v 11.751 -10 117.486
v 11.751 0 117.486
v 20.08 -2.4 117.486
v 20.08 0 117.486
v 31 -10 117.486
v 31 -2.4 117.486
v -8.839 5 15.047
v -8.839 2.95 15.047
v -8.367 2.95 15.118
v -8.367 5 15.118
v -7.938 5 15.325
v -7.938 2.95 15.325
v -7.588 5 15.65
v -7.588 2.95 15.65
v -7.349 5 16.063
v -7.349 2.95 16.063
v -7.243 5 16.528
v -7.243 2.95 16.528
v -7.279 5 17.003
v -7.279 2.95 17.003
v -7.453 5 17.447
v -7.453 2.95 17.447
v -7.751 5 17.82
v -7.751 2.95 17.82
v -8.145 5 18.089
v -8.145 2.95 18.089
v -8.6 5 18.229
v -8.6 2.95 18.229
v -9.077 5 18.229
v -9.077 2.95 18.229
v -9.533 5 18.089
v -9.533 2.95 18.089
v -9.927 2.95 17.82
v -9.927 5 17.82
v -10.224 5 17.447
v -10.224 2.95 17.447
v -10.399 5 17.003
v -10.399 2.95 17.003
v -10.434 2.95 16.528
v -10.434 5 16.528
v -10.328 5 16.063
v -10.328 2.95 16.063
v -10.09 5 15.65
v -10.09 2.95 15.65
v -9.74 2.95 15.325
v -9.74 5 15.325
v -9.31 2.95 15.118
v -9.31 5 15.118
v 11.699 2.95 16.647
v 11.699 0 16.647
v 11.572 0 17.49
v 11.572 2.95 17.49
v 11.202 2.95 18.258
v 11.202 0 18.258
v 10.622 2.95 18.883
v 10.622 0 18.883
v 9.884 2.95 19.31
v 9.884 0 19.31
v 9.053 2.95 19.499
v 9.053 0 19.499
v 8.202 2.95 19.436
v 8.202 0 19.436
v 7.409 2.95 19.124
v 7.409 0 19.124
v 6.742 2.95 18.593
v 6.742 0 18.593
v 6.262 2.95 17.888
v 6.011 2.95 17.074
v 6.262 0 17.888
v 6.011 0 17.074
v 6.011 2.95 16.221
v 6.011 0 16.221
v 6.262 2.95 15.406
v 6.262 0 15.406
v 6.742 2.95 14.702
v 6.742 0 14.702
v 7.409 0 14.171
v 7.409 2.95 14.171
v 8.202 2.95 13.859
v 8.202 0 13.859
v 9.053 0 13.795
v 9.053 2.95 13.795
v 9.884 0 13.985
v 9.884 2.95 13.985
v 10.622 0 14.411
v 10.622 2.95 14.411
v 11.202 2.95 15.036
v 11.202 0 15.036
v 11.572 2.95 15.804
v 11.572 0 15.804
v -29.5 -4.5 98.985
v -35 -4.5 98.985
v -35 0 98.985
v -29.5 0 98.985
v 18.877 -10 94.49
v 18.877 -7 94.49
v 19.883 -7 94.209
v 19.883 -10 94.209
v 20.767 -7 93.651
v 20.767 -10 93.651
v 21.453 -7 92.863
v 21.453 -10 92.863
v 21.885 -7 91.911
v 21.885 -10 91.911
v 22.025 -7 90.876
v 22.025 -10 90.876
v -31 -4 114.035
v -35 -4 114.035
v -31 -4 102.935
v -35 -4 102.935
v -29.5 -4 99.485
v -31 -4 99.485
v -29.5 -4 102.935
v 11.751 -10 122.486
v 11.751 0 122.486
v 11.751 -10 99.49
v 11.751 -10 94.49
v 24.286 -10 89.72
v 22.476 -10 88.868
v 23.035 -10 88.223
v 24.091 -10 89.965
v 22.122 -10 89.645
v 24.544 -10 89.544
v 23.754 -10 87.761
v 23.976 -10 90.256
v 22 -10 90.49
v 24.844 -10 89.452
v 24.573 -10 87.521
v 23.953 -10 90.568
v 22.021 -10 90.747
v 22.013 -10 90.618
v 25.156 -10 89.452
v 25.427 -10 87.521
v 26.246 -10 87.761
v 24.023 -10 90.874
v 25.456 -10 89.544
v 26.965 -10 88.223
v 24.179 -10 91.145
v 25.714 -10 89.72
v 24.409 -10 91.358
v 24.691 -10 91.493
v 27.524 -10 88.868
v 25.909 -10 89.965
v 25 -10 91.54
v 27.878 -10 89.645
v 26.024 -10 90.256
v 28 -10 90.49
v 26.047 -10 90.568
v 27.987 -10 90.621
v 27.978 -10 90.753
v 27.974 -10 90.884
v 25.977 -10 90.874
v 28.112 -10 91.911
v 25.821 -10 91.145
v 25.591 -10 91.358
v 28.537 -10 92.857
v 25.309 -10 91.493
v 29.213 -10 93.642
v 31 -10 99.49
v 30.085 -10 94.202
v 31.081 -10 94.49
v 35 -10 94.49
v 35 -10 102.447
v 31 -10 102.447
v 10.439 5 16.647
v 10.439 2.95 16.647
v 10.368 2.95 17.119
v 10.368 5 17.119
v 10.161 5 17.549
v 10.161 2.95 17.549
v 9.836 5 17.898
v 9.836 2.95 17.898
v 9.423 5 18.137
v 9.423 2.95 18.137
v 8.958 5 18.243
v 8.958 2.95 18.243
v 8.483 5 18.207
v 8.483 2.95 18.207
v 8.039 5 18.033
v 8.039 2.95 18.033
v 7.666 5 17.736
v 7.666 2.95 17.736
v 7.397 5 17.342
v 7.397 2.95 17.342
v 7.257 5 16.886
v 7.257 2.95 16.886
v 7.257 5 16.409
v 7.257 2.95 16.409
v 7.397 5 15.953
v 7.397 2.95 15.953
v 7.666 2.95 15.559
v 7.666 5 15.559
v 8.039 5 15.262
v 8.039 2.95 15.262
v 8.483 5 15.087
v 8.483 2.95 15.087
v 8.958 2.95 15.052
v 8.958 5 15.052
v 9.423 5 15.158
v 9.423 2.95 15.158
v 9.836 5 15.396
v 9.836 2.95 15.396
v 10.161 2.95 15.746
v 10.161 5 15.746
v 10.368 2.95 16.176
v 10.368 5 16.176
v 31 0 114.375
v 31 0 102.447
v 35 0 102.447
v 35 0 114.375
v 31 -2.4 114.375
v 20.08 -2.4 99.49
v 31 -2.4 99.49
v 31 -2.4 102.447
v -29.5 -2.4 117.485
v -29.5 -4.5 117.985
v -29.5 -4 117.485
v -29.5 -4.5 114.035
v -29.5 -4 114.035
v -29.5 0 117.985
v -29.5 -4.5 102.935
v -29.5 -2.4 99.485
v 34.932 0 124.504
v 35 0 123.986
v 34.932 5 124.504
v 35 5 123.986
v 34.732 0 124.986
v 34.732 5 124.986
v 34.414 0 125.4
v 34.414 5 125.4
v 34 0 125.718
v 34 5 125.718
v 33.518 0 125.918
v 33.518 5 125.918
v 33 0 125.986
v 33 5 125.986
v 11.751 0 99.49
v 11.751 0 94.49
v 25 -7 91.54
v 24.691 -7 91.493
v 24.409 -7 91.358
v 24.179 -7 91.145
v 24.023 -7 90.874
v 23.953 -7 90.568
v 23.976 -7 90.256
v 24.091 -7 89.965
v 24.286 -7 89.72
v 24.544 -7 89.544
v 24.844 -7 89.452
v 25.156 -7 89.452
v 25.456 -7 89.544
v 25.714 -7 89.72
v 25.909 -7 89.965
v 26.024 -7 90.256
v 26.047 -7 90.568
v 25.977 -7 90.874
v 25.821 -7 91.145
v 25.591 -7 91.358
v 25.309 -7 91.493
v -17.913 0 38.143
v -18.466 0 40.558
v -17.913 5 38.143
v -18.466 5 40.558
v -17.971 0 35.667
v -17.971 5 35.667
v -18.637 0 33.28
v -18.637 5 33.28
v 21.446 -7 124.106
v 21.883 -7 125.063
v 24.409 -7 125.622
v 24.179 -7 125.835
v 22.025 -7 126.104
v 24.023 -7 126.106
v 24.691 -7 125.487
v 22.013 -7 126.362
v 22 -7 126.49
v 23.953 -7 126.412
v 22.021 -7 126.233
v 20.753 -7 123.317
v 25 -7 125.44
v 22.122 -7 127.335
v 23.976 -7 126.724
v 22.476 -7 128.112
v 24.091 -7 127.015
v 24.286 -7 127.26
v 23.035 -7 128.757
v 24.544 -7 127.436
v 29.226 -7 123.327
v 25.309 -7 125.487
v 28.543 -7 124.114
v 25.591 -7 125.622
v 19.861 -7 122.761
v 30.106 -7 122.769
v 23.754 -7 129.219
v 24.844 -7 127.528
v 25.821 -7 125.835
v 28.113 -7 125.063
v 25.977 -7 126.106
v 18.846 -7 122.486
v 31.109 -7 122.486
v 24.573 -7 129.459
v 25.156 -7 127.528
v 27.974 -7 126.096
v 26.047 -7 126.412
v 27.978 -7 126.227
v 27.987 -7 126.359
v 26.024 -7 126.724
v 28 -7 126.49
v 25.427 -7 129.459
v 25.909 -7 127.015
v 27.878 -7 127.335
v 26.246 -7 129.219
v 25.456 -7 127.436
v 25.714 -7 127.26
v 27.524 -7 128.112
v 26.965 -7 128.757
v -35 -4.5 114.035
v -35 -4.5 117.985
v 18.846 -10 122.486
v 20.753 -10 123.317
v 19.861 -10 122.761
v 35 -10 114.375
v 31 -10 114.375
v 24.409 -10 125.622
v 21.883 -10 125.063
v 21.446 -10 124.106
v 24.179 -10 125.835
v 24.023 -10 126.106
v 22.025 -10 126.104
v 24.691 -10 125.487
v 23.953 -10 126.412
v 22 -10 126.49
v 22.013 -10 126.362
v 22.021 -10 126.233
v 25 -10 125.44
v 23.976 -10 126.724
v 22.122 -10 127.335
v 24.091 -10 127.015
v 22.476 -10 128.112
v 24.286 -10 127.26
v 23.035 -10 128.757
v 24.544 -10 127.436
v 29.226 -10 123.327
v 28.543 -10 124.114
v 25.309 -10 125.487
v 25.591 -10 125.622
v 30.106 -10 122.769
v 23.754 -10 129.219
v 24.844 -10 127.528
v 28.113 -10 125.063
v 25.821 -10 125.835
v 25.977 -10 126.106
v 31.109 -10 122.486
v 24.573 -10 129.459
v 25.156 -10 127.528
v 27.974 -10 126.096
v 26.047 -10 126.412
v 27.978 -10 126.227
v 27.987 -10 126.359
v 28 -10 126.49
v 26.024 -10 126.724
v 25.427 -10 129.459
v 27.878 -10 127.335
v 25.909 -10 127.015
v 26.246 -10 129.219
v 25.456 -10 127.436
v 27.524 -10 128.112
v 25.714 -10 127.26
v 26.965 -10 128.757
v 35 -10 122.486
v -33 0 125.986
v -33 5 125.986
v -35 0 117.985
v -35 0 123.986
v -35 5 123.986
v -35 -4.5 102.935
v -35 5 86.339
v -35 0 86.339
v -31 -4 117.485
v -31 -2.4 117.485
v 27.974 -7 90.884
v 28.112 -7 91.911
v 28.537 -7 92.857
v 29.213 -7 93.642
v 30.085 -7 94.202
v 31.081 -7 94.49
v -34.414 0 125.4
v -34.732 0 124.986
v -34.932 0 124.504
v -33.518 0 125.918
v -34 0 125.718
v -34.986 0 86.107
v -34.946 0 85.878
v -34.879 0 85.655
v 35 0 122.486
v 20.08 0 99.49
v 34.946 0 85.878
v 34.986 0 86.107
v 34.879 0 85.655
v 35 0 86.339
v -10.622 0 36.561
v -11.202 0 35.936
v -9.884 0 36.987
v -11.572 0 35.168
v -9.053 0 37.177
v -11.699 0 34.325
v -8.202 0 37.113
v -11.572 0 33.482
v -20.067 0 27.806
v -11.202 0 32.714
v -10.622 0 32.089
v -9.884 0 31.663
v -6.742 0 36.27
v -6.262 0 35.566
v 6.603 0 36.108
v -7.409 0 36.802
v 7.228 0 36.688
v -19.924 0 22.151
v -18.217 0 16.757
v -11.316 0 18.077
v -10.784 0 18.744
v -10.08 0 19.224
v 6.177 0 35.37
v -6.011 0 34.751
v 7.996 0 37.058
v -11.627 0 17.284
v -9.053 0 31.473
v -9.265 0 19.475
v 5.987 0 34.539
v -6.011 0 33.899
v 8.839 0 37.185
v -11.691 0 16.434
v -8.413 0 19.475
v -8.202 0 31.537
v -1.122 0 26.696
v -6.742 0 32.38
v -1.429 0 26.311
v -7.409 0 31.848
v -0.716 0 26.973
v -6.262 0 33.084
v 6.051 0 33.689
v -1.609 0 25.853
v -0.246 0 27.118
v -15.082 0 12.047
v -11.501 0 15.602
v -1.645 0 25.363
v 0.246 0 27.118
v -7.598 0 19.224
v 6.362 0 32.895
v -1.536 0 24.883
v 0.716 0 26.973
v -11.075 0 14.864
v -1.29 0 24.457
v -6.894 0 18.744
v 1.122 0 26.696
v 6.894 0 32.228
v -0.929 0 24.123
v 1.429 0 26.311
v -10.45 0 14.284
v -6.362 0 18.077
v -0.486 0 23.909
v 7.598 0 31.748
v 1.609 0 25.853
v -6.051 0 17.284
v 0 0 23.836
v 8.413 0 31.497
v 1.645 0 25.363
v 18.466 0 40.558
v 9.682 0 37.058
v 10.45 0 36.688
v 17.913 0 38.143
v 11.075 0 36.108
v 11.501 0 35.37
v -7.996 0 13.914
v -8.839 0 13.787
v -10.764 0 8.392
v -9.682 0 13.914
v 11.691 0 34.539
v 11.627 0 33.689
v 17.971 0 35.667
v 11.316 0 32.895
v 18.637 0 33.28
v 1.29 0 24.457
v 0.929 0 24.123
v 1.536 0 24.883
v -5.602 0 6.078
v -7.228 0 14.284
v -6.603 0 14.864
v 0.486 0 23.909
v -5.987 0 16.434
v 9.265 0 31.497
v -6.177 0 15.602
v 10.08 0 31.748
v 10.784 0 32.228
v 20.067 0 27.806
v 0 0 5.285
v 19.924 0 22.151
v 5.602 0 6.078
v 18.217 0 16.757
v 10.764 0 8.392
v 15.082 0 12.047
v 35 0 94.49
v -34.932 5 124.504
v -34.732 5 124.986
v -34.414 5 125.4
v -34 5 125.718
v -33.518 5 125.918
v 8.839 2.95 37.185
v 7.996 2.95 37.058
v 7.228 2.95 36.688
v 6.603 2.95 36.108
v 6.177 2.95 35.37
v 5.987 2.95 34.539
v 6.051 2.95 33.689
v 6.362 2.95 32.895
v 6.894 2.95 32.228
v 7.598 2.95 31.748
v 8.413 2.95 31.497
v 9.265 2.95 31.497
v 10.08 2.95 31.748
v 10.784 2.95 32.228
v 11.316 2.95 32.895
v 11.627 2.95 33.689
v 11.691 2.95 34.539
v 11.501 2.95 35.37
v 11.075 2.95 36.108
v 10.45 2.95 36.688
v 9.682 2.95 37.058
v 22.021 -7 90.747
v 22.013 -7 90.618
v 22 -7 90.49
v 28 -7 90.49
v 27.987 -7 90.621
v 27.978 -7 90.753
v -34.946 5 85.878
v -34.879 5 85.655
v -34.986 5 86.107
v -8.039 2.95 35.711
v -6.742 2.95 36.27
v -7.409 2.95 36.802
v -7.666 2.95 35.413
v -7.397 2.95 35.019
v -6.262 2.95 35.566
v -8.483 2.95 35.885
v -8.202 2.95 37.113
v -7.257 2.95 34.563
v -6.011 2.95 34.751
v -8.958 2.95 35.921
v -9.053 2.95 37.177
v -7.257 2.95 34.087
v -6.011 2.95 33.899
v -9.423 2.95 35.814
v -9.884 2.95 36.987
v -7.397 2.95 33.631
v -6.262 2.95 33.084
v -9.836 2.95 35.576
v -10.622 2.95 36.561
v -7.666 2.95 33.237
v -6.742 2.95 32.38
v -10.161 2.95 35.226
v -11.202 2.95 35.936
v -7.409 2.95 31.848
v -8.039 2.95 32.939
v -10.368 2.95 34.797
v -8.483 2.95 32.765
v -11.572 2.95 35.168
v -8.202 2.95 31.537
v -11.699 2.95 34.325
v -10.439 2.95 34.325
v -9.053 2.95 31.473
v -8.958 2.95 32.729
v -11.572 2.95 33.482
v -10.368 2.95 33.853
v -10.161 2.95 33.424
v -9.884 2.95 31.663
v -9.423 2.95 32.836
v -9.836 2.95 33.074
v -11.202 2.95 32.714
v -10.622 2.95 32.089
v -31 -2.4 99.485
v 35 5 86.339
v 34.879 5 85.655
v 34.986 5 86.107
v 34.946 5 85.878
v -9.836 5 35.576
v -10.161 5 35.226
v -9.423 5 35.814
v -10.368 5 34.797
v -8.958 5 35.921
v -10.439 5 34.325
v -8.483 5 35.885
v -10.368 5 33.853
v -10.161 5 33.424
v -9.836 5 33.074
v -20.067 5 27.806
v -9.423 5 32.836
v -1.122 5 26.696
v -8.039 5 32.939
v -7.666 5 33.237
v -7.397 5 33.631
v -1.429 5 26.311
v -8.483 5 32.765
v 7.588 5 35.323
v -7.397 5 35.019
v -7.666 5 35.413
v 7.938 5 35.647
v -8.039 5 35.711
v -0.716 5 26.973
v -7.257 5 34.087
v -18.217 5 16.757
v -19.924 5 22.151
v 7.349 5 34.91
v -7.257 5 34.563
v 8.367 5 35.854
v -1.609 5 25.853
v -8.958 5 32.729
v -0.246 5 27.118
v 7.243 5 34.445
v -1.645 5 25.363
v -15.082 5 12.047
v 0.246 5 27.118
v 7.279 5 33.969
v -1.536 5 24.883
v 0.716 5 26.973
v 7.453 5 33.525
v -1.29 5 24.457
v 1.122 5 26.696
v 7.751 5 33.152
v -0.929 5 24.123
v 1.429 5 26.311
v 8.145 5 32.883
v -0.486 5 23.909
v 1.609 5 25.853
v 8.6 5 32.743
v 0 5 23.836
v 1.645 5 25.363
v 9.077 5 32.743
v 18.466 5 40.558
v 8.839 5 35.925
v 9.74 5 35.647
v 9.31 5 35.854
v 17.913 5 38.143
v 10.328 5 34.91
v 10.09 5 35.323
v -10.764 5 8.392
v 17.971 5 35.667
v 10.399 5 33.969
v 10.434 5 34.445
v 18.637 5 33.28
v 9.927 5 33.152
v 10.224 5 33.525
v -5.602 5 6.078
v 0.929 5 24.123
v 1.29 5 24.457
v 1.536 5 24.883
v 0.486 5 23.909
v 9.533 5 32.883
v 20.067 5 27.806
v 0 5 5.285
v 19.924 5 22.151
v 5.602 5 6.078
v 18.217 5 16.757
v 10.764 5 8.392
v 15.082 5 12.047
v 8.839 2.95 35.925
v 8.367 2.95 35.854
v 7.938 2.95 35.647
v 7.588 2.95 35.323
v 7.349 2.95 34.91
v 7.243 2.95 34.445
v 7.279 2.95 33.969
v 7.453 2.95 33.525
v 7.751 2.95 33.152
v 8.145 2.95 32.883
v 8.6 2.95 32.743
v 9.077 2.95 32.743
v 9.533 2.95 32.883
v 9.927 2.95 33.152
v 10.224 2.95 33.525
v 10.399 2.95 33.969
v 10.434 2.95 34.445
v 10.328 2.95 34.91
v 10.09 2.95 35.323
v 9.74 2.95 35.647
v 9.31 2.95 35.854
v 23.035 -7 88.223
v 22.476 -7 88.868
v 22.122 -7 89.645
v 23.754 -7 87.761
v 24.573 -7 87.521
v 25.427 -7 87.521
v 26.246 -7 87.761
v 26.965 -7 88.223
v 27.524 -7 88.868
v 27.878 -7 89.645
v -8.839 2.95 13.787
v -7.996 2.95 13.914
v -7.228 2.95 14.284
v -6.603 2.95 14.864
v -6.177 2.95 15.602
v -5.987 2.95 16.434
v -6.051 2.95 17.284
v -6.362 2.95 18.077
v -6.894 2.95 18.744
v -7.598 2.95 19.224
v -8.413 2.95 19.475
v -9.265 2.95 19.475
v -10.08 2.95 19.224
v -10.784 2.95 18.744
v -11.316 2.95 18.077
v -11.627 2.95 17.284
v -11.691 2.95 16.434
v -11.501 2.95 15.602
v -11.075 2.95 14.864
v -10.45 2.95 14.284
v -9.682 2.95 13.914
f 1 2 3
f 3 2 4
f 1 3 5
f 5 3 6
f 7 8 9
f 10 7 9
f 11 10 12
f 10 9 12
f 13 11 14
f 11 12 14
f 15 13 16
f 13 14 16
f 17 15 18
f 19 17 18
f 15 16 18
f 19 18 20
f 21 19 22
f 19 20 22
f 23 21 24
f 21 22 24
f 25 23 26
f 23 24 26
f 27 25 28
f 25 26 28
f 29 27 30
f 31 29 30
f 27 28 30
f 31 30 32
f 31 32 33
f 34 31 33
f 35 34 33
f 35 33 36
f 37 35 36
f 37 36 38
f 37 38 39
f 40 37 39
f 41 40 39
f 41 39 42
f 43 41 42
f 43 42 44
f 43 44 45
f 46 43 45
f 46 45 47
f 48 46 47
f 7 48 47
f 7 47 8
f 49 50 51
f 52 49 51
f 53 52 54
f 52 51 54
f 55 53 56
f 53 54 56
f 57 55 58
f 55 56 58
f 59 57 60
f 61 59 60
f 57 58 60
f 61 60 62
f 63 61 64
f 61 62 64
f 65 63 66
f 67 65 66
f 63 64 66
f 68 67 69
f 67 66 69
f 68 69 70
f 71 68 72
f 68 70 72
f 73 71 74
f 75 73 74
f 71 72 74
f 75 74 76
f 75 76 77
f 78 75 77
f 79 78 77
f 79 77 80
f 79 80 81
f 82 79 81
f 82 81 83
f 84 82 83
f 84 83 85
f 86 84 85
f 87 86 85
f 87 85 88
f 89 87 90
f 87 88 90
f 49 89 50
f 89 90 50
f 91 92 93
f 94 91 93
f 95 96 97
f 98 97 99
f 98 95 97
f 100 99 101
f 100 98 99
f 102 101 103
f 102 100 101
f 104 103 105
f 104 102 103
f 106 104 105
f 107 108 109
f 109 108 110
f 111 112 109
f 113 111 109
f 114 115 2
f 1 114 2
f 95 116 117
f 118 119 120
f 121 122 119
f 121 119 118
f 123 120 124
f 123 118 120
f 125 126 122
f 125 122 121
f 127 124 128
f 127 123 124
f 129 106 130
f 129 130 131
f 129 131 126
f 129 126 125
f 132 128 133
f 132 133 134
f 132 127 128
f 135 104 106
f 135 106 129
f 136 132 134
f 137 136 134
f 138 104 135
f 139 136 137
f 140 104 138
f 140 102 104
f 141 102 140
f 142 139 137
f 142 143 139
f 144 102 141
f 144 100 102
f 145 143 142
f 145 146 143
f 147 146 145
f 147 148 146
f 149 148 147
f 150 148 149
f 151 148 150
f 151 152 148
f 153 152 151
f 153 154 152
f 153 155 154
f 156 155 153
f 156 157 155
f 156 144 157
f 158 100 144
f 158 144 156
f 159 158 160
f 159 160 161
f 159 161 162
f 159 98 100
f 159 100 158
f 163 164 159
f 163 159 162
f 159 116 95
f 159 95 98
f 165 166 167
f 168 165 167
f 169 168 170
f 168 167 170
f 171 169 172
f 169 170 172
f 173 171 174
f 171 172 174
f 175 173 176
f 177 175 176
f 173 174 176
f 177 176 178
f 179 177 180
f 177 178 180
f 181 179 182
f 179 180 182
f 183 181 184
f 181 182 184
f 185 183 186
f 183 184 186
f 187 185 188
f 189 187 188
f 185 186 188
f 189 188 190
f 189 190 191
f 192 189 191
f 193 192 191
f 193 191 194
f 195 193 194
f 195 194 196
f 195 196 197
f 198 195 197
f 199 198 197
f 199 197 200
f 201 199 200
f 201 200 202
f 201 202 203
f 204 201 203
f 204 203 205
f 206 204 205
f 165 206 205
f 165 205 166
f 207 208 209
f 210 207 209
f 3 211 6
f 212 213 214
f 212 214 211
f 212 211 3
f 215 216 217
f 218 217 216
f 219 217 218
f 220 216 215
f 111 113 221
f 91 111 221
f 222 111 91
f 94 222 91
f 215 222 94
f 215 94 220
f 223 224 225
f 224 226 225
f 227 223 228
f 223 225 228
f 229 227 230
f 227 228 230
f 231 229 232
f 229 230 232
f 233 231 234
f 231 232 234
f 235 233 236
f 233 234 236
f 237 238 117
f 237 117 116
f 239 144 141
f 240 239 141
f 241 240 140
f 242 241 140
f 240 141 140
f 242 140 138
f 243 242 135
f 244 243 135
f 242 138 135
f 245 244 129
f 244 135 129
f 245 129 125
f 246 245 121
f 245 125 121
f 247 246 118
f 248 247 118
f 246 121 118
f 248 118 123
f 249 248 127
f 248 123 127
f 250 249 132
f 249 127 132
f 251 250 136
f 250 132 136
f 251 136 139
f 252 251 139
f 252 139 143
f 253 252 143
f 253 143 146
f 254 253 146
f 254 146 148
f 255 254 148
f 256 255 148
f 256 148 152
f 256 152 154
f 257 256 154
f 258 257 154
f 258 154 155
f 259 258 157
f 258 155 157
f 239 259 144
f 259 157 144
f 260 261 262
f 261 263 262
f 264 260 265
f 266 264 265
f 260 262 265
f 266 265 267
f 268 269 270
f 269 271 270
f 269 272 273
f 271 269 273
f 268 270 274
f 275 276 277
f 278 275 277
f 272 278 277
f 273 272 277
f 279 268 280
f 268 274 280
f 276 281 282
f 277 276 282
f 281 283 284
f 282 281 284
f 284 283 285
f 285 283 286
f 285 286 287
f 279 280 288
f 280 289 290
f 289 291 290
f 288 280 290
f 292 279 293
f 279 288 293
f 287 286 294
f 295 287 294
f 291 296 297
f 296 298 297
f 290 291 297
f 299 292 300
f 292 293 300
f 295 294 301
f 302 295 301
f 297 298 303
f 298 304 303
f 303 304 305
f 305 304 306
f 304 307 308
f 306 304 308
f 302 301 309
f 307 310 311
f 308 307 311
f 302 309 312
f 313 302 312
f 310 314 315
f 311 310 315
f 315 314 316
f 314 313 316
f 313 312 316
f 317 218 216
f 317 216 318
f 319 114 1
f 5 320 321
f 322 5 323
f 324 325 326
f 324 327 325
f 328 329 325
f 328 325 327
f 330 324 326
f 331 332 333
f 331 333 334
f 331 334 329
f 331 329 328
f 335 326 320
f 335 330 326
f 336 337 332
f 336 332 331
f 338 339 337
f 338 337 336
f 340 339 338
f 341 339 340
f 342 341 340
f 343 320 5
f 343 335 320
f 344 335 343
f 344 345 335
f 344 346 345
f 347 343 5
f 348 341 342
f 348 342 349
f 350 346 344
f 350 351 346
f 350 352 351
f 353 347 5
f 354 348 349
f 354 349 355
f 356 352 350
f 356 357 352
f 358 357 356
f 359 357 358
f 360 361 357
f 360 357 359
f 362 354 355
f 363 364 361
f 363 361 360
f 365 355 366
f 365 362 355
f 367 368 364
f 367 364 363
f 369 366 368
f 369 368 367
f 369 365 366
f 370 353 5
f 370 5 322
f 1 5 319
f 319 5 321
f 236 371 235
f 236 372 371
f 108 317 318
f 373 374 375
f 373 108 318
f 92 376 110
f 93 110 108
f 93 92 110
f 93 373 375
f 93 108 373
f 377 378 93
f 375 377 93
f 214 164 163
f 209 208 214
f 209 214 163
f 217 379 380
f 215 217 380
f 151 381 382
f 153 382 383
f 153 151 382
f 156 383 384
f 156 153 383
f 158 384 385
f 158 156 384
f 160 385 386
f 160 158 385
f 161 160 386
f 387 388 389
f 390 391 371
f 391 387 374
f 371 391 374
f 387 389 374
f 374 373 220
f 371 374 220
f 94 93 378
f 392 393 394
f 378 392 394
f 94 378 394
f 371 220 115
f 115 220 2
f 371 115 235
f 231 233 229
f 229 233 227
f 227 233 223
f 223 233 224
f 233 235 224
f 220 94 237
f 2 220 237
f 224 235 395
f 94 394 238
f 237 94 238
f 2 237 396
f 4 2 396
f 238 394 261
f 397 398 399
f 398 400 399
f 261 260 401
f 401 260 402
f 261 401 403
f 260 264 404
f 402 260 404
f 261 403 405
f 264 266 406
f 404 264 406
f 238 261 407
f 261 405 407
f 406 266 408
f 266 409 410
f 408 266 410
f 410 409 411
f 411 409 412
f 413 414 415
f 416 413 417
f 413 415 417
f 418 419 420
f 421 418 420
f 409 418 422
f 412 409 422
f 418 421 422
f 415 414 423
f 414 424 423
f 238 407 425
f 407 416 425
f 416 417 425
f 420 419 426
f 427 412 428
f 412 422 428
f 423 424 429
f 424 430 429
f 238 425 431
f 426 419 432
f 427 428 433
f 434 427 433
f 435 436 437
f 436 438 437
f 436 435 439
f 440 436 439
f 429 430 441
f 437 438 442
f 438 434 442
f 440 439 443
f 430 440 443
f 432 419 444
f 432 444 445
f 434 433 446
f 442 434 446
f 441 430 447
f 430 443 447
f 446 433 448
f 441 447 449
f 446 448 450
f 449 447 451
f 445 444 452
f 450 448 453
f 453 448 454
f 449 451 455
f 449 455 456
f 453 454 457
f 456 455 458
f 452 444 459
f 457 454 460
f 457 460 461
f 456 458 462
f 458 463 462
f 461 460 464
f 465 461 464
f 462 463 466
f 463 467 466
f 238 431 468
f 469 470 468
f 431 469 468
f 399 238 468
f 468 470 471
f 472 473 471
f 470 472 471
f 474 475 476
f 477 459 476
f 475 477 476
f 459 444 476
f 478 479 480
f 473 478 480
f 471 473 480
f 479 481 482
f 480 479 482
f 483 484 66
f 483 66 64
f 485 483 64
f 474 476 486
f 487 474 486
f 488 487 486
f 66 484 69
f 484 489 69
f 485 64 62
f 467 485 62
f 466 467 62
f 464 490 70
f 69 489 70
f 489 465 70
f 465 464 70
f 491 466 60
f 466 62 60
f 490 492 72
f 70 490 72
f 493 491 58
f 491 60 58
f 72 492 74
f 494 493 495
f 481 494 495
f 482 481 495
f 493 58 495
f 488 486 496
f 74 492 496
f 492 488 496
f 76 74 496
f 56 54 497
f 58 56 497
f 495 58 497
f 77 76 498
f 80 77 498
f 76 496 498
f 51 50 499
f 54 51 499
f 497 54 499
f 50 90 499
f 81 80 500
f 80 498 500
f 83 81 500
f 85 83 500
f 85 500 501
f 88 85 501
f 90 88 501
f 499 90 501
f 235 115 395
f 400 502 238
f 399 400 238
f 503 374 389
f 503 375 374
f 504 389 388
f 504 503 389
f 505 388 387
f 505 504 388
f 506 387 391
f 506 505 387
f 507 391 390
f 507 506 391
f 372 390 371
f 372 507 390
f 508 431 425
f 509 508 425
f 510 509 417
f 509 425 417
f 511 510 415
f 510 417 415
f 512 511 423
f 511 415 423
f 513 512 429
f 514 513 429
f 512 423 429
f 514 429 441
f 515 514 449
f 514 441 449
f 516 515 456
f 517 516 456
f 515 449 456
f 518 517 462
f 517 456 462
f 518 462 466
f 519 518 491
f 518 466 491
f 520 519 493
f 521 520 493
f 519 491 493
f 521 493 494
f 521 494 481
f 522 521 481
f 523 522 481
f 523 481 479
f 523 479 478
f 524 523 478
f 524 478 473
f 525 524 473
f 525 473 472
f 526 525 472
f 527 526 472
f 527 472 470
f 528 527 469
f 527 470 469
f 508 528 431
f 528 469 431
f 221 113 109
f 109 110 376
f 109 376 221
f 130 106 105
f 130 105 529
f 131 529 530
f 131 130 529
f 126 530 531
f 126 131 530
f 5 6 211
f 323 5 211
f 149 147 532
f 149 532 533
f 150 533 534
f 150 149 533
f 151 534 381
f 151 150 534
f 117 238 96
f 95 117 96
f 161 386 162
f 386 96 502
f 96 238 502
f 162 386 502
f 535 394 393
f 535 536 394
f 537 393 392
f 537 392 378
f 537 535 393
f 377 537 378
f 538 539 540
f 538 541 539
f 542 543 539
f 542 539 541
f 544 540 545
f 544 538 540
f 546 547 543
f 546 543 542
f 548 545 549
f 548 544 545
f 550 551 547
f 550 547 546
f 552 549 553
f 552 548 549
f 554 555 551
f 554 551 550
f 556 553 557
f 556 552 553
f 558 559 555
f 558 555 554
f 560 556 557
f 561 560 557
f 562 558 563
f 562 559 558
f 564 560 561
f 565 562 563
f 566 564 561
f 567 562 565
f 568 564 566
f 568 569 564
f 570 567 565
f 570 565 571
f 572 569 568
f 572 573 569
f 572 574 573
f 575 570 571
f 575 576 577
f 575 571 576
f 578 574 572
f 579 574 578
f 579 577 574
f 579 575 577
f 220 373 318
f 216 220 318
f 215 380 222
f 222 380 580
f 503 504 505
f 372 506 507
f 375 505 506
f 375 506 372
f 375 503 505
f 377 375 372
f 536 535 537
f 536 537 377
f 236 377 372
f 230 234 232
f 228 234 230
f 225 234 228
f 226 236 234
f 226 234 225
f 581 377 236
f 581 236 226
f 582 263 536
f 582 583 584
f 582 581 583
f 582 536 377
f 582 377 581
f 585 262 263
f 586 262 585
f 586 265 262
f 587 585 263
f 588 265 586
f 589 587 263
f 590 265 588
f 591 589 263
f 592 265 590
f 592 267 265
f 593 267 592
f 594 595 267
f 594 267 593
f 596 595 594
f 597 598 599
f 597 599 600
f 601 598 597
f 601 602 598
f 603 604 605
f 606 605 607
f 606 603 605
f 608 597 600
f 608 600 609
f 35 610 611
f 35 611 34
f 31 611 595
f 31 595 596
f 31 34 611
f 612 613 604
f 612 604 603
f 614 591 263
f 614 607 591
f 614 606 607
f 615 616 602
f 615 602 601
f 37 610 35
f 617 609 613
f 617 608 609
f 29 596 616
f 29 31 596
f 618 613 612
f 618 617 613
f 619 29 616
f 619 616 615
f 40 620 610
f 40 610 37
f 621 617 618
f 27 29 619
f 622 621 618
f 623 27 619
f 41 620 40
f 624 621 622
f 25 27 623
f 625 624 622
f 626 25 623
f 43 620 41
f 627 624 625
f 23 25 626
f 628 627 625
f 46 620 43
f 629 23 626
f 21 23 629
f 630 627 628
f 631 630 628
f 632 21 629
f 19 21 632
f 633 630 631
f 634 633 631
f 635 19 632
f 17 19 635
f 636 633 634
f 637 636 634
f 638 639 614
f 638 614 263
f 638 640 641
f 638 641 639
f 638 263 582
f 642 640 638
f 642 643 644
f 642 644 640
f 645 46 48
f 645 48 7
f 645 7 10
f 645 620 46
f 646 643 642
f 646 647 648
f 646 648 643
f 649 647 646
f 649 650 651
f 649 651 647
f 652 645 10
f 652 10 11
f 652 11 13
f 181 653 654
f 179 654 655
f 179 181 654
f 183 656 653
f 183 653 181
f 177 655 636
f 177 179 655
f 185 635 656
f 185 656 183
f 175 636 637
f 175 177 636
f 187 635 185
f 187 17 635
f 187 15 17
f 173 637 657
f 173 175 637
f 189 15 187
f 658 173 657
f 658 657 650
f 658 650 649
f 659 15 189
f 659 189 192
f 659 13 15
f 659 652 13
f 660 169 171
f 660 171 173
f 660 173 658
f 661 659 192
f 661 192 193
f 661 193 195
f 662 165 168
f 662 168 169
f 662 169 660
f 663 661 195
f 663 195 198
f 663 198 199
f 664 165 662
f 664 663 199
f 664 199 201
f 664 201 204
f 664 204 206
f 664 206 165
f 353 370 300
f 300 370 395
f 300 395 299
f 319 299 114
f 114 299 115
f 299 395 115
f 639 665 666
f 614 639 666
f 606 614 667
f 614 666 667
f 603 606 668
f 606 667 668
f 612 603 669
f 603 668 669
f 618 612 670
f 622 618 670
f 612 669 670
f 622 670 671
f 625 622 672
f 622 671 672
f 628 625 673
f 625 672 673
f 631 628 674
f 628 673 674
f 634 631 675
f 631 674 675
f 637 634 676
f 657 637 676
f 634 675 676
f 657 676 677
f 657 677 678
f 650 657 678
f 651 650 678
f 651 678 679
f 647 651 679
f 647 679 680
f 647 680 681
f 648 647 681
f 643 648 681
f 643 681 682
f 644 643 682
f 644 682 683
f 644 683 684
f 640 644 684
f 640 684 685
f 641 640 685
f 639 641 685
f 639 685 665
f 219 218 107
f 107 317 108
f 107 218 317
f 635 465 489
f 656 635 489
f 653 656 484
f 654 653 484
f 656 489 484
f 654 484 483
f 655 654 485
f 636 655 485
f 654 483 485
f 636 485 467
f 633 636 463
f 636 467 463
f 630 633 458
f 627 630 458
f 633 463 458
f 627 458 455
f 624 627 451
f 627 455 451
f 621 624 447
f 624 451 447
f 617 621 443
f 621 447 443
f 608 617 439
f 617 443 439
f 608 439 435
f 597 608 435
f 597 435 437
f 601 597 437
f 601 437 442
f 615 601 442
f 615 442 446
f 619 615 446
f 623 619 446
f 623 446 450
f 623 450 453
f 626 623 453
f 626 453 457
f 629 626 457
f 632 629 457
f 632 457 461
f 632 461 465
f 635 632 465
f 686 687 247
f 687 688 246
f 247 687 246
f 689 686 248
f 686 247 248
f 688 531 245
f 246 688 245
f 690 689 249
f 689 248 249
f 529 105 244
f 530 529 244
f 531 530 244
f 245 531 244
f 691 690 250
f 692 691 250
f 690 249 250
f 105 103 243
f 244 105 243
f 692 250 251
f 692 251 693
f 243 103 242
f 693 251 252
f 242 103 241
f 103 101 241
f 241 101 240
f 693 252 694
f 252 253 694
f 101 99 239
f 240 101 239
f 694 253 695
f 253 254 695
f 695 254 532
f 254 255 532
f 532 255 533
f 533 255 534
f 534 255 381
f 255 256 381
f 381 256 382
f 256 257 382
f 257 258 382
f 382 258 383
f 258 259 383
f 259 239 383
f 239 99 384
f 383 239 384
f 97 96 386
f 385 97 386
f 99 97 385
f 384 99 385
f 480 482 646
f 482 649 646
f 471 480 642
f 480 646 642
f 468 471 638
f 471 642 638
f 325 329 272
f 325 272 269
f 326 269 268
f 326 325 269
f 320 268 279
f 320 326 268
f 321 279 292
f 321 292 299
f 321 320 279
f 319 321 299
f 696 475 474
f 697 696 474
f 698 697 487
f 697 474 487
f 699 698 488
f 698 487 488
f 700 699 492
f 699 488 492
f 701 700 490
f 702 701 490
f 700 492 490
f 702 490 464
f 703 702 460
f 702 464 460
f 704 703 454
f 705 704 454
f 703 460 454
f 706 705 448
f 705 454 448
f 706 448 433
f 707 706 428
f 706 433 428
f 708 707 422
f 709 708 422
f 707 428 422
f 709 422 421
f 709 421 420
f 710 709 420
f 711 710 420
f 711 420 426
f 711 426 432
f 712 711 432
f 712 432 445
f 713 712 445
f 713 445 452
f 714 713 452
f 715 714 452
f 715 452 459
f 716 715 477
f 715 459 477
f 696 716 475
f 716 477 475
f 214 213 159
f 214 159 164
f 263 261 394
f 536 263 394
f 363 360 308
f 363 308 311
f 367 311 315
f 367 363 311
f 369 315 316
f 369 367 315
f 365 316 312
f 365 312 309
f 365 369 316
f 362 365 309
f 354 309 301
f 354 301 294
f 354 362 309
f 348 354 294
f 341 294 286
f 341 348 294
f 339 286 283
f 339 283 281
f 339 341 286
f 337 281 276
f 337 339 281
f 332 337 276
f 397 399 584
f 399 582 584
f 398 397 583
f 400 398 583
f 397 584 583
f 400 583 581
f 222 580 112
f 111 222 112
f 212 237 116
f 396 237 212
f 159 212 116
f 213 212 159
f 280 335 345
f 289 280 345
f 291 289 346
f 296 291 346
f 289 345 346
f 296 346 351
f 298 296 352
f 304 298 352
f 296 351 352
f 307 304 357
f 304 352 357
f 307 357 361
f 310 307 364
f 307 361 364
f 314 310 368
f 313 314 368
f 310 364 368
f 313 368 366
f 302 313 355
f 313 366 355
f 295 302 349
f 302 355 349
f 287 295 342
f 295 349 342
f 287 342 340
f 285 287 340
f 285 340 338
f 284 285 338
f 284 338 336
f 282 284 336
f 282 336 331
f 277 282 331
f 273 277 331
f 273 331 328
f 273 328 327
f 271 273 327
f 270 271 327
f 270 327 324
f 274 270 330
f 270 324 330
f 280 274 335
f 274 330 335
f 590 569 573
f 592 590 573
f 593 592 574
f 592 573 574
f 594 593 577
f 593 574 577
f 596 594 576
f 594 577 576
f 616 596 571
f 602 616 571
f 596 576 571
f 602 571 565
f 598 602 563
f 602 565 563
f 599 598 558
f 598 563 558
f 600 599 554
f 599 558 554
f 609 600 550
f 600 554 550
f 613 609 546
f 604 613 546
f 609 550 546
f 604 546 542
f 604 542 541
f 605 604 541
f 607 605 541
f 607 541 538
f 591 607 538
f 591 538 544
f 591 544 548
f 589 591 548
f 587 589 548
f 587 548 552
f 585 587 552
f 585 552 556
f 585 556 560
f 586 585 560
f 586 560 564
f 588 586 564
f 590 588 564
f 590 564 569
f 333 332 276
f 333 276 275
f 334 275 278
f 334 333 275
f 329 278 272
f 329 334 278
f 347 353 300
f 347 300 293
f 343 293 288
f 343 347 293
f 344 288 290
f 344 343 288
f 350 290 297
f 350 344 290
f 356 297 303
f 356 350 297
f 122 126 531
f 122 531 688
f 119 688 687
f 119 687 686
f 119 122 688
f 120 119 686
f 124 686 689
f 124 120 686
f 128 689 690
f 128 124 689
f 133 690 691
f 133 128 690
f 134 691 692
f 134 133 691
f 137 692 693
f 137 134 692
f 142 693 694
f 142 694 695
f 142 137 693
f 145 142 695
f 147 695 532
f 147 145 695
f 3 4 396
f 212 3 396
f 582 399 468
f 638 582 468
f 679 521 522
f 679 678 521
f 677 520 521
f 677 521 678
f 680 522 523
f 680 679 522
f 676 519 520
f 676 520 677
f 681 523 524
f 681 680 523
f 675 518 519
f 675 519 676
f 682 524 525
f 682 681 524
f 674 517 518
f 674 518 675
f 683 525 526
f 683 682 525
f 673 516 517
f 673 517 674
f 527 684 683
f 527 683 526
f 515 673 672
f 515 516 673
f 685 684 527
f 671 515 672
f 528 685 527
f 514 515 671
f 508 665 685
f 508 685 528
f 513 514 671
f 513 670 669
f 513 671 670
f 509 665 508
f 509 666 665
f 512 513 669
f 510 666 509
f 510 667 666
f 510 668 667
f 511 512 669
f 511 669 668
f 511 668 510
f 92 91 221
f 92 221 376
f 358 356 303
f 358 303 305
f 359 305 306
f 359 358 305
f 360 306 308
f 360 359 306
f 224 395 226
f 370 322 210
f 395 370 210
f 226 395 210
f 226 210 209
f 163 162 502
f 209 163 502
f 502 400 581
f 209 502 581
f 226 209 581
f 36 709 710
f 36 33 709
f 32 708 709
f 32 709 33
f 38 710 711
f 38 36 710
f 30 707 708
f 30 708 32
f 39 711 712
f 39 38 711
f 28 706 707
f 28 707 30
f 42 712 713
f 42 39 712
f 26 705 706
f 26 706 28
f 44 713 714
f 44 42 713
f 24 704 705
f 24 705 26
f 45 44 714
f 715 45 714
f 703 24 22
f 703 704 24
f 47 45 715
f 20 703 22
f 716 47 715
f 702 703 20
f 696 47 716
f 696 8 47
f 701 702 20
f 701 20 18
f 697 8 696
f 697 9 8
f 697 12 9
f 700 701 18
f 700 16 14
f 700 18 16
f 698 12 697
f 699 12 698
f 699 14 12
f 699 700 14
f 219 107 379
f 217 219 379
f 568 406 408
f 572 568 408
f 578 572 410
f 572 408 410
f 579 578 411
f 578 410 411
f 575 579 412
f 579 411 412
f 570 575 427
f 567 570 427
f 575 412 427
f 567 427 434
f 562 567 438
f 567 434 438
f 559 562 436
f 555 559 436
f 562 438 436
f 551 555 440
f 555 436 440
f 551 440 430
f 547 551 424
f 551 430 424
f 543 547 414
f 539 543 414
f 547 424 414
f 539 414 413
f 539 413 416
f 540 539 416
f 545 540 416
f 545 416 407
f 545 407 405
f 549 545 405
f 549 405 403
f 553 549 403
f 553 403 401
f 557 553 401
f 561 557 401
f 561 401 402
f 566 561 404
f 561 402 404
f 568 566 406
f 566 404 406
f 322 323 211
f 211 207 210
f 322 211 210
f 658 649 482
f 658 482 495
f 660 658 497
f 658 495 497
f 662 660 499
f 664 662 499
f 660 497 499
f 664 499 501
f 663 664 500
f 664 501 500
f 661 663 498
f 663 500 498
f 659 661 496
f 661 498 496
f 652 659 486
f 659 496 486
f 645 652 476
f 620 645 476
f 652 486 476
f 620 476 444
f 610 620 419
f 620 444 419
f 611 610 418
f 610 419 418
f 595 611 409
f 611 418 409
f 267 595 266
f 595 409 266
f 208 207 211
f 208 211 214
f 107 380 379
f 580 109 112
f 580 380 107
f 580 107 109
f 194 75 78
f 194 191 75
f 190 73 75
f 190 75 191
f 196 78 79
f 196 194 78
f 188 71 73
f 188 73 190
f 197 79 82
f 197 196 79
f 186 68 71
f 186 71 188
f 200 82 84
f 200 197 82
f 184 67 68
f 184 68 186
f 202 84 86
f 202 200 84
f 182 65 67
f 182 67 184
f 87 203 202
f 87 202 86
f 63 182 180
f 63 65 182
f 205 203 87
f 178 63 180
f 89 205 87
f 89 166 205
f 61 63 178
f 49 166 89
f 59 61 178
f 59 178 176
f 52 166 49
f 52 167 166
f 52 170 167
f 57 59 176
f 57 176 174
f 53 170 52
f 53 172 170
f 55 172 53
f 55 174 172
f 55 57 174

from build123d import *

# Parameters (mm, degrees)
BOSS_EXTRUDE4_DEPTH     = 5
SKETCH11_W              = 70
SKETCH11_H              = 5
BOSS_EXTRUDE5_DEPTH     = 40
FILLET1_R               = 10
FILLET2_R               = 10
SKETCH21_R              = 1.6
CUT_EXTRUDE1_DEPTH      = 131.853043071
CIRPATTERN1_COUNT       = 4
SKETCH22_R              = 2.86
CUT_EXTRUDE2_DEPTH      = 2.95
CIRPATTERN2_COUNT       = 4
FILLET4_R               = 2
SKETCH25_W              = 19
SKETCH25_H              = 10
BOSS_EXTRUDE6_DEPTH     = 4
CUT_EXTRUDE4_DEPTH      = 9.5
CUT_EXTRUDE4_DEPTH_BACK = 5.5
SKETCH26_W              = 11.1
SKETCH26_H              = 12
BOSS_EXTRUDE9_DEPTH     = 1.5
BOSS_EXTRUDE10_DEPTH    = 10
SKETCH35_W              = 10.92028557
SKETCH35_H              = 17.996185279
BOSS_EXTRUDE11_DEPTH    = 2.4
BOSS_EXTRUDE12_DEPTH    = 3
SKETCH37_R              = 1.05
CUT_EXTRUDE6_DEPTH      = 3
SKETCH39_R              = 1.65
CUT_EXTRUDE7_DEPTH      = 135.508959181
SKETCH40_W              = 4
SKETCH40_H              = 19
CUT_EXTRUDE8_DEPTH      = 5.5


with BuildPart() as part:
    # Sketch9 → Boss-Extrude4 (new body)
    with BuildSketch(Plane(origin=(0, 0, 0), x_dir=(1, 0, 0), z_dir=(0, 1, 0))):
        with BuildLine():
            Line((-35, -85.986185279), (35, -85.986185279))
            Line((35, -85.986185279), (16.969019665, -36.446473957))
            ThreePointArc((16.969019665, -36.446473957), (0, -5.285305191), (-16.969019665, -36.446473957))
            Line((-16.969019665, -36.446473957), (-35, -85.986185279))
        make_face()
    extrude(amount=BOSS_EXTRUDE4_DEPTH)

    # Sketch11 → Boss-Extrude5 (add)
    with BuildSketch(Plane.XY.offset(85.986185279)):
        with Locations((0, 2.5)):
            Rectangle(SKETCH11_W, SKETCH11_H)
    extrude(amount=BOSS_EXTRUDE5_DEPTH)

    # Fillet1
    fillet1_edges = [part.edges().sort_by_distance(p)[0] for p in [
        (-16.969019665, 2.5, 36.446473957),
    ]]
    fillet(fillet1_edges, radius=FILLET1_R)

    # Fillet2
    fillet2_edges = [part.edges().sort_by_distance(p)[0] for p in [
        (16.969019665, 2.5, 36.446473957),
    ]]
    fillet(fillet2_edges, radius=FILLET2_R)

    # Sketch21 → Cut-Extrude1 (cut, through all)
    with BuildSketch(Plane(origin=(0, 0, 0), x_dir=(-1, 0, 0), z_dir=(0, -1, 0))):
        with Locations(Location((8.838834765, -16.647350514, 0), (0, 0, 90))):
            Circle(SKETCH21_R)
    cut_extrude1 = extrude(amount=-CUT_EXTRUDE1_DEPTH, mode=Mode.SUBTRACT)

    # CirPattern1: Cut-Extrude1 ×4 about axis
    cirpattern1_axis = Axis((0, 0, 25.486185279), (0, 1, 0))
    for i in range(1, CIRPATTERN1_COUNT):
        add(cut_extrude1.rotate(cirpattern1_axis, i * 360 / CIRPATTERN1_COUNT), mode=Mode.SUBTRACT)

    # Sketch22 → Cut-Extrude2 (cut)
    with BuildSketch(Plane(origin=(0, 0, 0), x_dir=(-1, 0, 0), z_dir=(0, -1, 0))):
        with Locations(Location((8.838834765, -16.647350514, 0), (0, 0, 90))):
            Circle(SKETCH22_R)
    cut_extrude2 = extrude(amount=-CUT_EXTRUDE2_DEPTH, mode=Mode.SUBTRACT)

    # CirPattern2: Cut-Extrude2 ×4 about axis
    cirpattern2_axis = Axis((0, 0, 25.486185279), (0, 1, 0))
    for i in range(1, CIRPATTERN2_COUNT):
        add(cut_extrude2.rotate(cirpattern2_axis, i * 360 / CIRPATTERN2_COUNT), mode=Mode.SUBTRACT)

    # Fillet4
    fillet4_edges = [part.edges().sort_by_distance(p)[0] for p in [
        (35, 2.5, 125.986185279),
        (-35, 2.5, 125.986185279),
        (35, 2.5, 85.986185279),
        (-35, 2.5, 85.986185279),
    ]]
    fillet(fillet4_edges, radius=FILLET4_R)

    # Sketch25 → Boss-Extrude6 (add)
    with BuildSketch(Plane(origin=(-35, 0, -0.505457993), x_dir=(0, 0, -1), z_dir=(1, 0, 0))):
        with Locations((-108.99, -5)):
            Rectangle(SKETCH25_W, SKETCH25_H)
    extrude(amount=BOSS_EXTRUDE6_DEPTH)

    # Sketch26 → Cut-Extrude4 (cut, two sides: drawn at the far end of the back side and taken through both)
    with BuildSketch(Plane(origin=(-31, 0, -0.505457993), x_dir=(0, 0, -1), z_dir=(1, 0, 0)).offset(-CUT_EXTRUDE4_DEPTH_BACK)):
        with Locations((-108.99, -10)):
            Rectangle(SKETCH26_W, SKETCH26_H)
    extrude(amount=CUT_EXTRUDE4_DEPTH + CUT_EXTRUDE4_DEPTH_BACK, mode=Mode.SUBTRACT)

    # Sketch31 → Boss-Extrude9 (add)
    with BuildSketch(Plane(origin=(-31, 0, 0), x_dir=(0, 0, -1), z_dir=(1, 0, 0))):
        Polygon((-99.484542007, -4), (-102.934542007, -4), (-102.934542007, -4.5), (-98.984542007, -4.5), (-98.984542007, 0), (-117.984542007, 0), (-117.984542007, -4.5), (-114.034542007, -4.5), (-114.034542007, -4), (-117.484542007, -4), (-117.484542007, -2.4), (-99.484542007, -2.4), align=None)
    extrude(amount=BOSS_EXTRUDE9_DEPTH)

    # Sketch32 → Boss-Extrude10 (add)
    with BuildSketch(Plane.XZ):
        Polygon((31, 99.49), (31, 102.447343342), (35, 102.447343342), (35, 94.49), (20.07971443, 94.49), (11.750844515, 94.49), (11.750844515, 99.49), align=None)
        Polygon((31, 117.486185279), (31, 114.375323916), (35, 114.375323916), (35, 122.486185279), (20.07971443, 122.486185279), (11.750844515, 122.486185279), (11.750844515, 117.486185279), align=None)
    extrude(amount=BOSS_EXTRUDE10_DEPTH)

    # Sketch35 → Boss-Extrude11 (add)
    with BuildSketch(Plane(origin=(0, 0, 0), x_dir=(-1, 0, 0), z_dir=(0, -1, 0))):
        with Locations((-25.539857215, -108.48809264)):
            Rectangle(SKETCH35_W, SKETCH35_H)
    extrude(amount=BOSS_EXTRUDE11_DEPTH)

    # Sketch36 → Boss-Extrude12 (add)
    with BuildSketch(Plane.XZ.offset(10)):
        with BuildLine():
            ThreePointArc((22.024925014, 126.104087017), (24.995762953, 123.490002992), (27.97397303, 126.095684876))
            ThreePointArc((27.97397303, 126.095684876), (27.981571922, 126.293199831), (28, 126.49))
            ThreePointArc((28, 126.49), (25, 129.49), (22, 126.49))
            ThreePointArc((22, 126.49), (22.017642345, 126.297378059), (22.024925014, 126.104087017))
        make_face()
        with BuildLine():
            Line((18.846010194, 122.486185279), (31.109279434, 122.486185279))
            ThreePointArc((31.109279434, 122.486185279), (28.855912346, 123.695305938), (27.97397303, 126.095684876))
            ThreePointArc((27.97397303, 126.095684876), (24.995762953, 123.490002992), (22.024925014, 126.104087017))
            ThreePointArc((22.024925014, 126.104087017), (21.128493018, 123.68620066), (18.846010194, 122.486185279))
        make_face()
        with BuildLine():
            ThreePointArc((28, 90.49), (27.981571922, 90.686800169), (27.97397303, 90.884315124))
            ThreePointArc((27.97397303, 90.884315124), (24.995762953, 93.489997008), (22.024925014, 90.875912983))
            ThreePointArc((22.024925014, 90.875912983), (22.017642345, 90.682621941), (22, 90.49))
            ThreePointArc((22, 90.49), (25, 87.49), (28, 90.49))
        make_face()
        with BuildLine():
            ThreePointArc((27.97397303, 90.884315124), (28.855912346, 93.284694062), (31.109279434, 94.493814721))
            Line((31.109279434, 94.493814721), (18.846010194, 94.493814721))
            ThreePointArc((18.846010194, 94.493814721), (21.128493018, 93.29379934), (22.024925014, 90.875912983))
            ThreePointArc((22.024925014, 90.875912983), (24.995762953, 93.489997008), (27.97397303, 90.884315124))
        make_face()
    extrude(amount=-BOSS_EXTRUDE12_DEPTH)

    # Sketch37 → Cut-Extrude6 (cut)
    with BuildSketch(Plane(origin=(0, -10, 0), x_dir=(-1, 0, 0), z_dir=(0, -1, 0))):
        with Locations(Location((-25, -126.49, 0), (0, 0, 90))):
            Circle(SKETCH37_R)
        with Locations(Location((-25, -90.49, 0), (0, 0, 270))):
            Circle(SKETCH37_R)
    extrude(amount=-CUT_EXTRUDE6_DEPTH, mode=Mode.SUBTRACT)

    # Sketch39 → Cut-Extrude7 (cut, through all)
    with BuildSketch(Plane(origin=(0, 0, 0), x_dir=(-1, 0, 0), z_dir=(0, -1, 0))):
        with Locations(Location((0, -25.486185279, 0), (0, 0, 90))):
            Circle(SKETCH39_R)
    extrude(amount=-CUT_EXTRUDE7_DEPTH, mode=Mode.SUBTRACT)

    # Sketch40 → Cut-Extrude8 (cut)
    with BuildSketch(Plane(origin=(0, -10, 0), x_dir=(-1, 0, 0), z_dir=(0, -1, 0))):
        with Locations((33, -108.484542007)):
            Rectangle(SKETCH40_W, SKETCH40_H)
    extrude(amount=-CUT_EXTRUDE8_DEPTH, mode=Mode.SUBTRACT)


solid = part.part
